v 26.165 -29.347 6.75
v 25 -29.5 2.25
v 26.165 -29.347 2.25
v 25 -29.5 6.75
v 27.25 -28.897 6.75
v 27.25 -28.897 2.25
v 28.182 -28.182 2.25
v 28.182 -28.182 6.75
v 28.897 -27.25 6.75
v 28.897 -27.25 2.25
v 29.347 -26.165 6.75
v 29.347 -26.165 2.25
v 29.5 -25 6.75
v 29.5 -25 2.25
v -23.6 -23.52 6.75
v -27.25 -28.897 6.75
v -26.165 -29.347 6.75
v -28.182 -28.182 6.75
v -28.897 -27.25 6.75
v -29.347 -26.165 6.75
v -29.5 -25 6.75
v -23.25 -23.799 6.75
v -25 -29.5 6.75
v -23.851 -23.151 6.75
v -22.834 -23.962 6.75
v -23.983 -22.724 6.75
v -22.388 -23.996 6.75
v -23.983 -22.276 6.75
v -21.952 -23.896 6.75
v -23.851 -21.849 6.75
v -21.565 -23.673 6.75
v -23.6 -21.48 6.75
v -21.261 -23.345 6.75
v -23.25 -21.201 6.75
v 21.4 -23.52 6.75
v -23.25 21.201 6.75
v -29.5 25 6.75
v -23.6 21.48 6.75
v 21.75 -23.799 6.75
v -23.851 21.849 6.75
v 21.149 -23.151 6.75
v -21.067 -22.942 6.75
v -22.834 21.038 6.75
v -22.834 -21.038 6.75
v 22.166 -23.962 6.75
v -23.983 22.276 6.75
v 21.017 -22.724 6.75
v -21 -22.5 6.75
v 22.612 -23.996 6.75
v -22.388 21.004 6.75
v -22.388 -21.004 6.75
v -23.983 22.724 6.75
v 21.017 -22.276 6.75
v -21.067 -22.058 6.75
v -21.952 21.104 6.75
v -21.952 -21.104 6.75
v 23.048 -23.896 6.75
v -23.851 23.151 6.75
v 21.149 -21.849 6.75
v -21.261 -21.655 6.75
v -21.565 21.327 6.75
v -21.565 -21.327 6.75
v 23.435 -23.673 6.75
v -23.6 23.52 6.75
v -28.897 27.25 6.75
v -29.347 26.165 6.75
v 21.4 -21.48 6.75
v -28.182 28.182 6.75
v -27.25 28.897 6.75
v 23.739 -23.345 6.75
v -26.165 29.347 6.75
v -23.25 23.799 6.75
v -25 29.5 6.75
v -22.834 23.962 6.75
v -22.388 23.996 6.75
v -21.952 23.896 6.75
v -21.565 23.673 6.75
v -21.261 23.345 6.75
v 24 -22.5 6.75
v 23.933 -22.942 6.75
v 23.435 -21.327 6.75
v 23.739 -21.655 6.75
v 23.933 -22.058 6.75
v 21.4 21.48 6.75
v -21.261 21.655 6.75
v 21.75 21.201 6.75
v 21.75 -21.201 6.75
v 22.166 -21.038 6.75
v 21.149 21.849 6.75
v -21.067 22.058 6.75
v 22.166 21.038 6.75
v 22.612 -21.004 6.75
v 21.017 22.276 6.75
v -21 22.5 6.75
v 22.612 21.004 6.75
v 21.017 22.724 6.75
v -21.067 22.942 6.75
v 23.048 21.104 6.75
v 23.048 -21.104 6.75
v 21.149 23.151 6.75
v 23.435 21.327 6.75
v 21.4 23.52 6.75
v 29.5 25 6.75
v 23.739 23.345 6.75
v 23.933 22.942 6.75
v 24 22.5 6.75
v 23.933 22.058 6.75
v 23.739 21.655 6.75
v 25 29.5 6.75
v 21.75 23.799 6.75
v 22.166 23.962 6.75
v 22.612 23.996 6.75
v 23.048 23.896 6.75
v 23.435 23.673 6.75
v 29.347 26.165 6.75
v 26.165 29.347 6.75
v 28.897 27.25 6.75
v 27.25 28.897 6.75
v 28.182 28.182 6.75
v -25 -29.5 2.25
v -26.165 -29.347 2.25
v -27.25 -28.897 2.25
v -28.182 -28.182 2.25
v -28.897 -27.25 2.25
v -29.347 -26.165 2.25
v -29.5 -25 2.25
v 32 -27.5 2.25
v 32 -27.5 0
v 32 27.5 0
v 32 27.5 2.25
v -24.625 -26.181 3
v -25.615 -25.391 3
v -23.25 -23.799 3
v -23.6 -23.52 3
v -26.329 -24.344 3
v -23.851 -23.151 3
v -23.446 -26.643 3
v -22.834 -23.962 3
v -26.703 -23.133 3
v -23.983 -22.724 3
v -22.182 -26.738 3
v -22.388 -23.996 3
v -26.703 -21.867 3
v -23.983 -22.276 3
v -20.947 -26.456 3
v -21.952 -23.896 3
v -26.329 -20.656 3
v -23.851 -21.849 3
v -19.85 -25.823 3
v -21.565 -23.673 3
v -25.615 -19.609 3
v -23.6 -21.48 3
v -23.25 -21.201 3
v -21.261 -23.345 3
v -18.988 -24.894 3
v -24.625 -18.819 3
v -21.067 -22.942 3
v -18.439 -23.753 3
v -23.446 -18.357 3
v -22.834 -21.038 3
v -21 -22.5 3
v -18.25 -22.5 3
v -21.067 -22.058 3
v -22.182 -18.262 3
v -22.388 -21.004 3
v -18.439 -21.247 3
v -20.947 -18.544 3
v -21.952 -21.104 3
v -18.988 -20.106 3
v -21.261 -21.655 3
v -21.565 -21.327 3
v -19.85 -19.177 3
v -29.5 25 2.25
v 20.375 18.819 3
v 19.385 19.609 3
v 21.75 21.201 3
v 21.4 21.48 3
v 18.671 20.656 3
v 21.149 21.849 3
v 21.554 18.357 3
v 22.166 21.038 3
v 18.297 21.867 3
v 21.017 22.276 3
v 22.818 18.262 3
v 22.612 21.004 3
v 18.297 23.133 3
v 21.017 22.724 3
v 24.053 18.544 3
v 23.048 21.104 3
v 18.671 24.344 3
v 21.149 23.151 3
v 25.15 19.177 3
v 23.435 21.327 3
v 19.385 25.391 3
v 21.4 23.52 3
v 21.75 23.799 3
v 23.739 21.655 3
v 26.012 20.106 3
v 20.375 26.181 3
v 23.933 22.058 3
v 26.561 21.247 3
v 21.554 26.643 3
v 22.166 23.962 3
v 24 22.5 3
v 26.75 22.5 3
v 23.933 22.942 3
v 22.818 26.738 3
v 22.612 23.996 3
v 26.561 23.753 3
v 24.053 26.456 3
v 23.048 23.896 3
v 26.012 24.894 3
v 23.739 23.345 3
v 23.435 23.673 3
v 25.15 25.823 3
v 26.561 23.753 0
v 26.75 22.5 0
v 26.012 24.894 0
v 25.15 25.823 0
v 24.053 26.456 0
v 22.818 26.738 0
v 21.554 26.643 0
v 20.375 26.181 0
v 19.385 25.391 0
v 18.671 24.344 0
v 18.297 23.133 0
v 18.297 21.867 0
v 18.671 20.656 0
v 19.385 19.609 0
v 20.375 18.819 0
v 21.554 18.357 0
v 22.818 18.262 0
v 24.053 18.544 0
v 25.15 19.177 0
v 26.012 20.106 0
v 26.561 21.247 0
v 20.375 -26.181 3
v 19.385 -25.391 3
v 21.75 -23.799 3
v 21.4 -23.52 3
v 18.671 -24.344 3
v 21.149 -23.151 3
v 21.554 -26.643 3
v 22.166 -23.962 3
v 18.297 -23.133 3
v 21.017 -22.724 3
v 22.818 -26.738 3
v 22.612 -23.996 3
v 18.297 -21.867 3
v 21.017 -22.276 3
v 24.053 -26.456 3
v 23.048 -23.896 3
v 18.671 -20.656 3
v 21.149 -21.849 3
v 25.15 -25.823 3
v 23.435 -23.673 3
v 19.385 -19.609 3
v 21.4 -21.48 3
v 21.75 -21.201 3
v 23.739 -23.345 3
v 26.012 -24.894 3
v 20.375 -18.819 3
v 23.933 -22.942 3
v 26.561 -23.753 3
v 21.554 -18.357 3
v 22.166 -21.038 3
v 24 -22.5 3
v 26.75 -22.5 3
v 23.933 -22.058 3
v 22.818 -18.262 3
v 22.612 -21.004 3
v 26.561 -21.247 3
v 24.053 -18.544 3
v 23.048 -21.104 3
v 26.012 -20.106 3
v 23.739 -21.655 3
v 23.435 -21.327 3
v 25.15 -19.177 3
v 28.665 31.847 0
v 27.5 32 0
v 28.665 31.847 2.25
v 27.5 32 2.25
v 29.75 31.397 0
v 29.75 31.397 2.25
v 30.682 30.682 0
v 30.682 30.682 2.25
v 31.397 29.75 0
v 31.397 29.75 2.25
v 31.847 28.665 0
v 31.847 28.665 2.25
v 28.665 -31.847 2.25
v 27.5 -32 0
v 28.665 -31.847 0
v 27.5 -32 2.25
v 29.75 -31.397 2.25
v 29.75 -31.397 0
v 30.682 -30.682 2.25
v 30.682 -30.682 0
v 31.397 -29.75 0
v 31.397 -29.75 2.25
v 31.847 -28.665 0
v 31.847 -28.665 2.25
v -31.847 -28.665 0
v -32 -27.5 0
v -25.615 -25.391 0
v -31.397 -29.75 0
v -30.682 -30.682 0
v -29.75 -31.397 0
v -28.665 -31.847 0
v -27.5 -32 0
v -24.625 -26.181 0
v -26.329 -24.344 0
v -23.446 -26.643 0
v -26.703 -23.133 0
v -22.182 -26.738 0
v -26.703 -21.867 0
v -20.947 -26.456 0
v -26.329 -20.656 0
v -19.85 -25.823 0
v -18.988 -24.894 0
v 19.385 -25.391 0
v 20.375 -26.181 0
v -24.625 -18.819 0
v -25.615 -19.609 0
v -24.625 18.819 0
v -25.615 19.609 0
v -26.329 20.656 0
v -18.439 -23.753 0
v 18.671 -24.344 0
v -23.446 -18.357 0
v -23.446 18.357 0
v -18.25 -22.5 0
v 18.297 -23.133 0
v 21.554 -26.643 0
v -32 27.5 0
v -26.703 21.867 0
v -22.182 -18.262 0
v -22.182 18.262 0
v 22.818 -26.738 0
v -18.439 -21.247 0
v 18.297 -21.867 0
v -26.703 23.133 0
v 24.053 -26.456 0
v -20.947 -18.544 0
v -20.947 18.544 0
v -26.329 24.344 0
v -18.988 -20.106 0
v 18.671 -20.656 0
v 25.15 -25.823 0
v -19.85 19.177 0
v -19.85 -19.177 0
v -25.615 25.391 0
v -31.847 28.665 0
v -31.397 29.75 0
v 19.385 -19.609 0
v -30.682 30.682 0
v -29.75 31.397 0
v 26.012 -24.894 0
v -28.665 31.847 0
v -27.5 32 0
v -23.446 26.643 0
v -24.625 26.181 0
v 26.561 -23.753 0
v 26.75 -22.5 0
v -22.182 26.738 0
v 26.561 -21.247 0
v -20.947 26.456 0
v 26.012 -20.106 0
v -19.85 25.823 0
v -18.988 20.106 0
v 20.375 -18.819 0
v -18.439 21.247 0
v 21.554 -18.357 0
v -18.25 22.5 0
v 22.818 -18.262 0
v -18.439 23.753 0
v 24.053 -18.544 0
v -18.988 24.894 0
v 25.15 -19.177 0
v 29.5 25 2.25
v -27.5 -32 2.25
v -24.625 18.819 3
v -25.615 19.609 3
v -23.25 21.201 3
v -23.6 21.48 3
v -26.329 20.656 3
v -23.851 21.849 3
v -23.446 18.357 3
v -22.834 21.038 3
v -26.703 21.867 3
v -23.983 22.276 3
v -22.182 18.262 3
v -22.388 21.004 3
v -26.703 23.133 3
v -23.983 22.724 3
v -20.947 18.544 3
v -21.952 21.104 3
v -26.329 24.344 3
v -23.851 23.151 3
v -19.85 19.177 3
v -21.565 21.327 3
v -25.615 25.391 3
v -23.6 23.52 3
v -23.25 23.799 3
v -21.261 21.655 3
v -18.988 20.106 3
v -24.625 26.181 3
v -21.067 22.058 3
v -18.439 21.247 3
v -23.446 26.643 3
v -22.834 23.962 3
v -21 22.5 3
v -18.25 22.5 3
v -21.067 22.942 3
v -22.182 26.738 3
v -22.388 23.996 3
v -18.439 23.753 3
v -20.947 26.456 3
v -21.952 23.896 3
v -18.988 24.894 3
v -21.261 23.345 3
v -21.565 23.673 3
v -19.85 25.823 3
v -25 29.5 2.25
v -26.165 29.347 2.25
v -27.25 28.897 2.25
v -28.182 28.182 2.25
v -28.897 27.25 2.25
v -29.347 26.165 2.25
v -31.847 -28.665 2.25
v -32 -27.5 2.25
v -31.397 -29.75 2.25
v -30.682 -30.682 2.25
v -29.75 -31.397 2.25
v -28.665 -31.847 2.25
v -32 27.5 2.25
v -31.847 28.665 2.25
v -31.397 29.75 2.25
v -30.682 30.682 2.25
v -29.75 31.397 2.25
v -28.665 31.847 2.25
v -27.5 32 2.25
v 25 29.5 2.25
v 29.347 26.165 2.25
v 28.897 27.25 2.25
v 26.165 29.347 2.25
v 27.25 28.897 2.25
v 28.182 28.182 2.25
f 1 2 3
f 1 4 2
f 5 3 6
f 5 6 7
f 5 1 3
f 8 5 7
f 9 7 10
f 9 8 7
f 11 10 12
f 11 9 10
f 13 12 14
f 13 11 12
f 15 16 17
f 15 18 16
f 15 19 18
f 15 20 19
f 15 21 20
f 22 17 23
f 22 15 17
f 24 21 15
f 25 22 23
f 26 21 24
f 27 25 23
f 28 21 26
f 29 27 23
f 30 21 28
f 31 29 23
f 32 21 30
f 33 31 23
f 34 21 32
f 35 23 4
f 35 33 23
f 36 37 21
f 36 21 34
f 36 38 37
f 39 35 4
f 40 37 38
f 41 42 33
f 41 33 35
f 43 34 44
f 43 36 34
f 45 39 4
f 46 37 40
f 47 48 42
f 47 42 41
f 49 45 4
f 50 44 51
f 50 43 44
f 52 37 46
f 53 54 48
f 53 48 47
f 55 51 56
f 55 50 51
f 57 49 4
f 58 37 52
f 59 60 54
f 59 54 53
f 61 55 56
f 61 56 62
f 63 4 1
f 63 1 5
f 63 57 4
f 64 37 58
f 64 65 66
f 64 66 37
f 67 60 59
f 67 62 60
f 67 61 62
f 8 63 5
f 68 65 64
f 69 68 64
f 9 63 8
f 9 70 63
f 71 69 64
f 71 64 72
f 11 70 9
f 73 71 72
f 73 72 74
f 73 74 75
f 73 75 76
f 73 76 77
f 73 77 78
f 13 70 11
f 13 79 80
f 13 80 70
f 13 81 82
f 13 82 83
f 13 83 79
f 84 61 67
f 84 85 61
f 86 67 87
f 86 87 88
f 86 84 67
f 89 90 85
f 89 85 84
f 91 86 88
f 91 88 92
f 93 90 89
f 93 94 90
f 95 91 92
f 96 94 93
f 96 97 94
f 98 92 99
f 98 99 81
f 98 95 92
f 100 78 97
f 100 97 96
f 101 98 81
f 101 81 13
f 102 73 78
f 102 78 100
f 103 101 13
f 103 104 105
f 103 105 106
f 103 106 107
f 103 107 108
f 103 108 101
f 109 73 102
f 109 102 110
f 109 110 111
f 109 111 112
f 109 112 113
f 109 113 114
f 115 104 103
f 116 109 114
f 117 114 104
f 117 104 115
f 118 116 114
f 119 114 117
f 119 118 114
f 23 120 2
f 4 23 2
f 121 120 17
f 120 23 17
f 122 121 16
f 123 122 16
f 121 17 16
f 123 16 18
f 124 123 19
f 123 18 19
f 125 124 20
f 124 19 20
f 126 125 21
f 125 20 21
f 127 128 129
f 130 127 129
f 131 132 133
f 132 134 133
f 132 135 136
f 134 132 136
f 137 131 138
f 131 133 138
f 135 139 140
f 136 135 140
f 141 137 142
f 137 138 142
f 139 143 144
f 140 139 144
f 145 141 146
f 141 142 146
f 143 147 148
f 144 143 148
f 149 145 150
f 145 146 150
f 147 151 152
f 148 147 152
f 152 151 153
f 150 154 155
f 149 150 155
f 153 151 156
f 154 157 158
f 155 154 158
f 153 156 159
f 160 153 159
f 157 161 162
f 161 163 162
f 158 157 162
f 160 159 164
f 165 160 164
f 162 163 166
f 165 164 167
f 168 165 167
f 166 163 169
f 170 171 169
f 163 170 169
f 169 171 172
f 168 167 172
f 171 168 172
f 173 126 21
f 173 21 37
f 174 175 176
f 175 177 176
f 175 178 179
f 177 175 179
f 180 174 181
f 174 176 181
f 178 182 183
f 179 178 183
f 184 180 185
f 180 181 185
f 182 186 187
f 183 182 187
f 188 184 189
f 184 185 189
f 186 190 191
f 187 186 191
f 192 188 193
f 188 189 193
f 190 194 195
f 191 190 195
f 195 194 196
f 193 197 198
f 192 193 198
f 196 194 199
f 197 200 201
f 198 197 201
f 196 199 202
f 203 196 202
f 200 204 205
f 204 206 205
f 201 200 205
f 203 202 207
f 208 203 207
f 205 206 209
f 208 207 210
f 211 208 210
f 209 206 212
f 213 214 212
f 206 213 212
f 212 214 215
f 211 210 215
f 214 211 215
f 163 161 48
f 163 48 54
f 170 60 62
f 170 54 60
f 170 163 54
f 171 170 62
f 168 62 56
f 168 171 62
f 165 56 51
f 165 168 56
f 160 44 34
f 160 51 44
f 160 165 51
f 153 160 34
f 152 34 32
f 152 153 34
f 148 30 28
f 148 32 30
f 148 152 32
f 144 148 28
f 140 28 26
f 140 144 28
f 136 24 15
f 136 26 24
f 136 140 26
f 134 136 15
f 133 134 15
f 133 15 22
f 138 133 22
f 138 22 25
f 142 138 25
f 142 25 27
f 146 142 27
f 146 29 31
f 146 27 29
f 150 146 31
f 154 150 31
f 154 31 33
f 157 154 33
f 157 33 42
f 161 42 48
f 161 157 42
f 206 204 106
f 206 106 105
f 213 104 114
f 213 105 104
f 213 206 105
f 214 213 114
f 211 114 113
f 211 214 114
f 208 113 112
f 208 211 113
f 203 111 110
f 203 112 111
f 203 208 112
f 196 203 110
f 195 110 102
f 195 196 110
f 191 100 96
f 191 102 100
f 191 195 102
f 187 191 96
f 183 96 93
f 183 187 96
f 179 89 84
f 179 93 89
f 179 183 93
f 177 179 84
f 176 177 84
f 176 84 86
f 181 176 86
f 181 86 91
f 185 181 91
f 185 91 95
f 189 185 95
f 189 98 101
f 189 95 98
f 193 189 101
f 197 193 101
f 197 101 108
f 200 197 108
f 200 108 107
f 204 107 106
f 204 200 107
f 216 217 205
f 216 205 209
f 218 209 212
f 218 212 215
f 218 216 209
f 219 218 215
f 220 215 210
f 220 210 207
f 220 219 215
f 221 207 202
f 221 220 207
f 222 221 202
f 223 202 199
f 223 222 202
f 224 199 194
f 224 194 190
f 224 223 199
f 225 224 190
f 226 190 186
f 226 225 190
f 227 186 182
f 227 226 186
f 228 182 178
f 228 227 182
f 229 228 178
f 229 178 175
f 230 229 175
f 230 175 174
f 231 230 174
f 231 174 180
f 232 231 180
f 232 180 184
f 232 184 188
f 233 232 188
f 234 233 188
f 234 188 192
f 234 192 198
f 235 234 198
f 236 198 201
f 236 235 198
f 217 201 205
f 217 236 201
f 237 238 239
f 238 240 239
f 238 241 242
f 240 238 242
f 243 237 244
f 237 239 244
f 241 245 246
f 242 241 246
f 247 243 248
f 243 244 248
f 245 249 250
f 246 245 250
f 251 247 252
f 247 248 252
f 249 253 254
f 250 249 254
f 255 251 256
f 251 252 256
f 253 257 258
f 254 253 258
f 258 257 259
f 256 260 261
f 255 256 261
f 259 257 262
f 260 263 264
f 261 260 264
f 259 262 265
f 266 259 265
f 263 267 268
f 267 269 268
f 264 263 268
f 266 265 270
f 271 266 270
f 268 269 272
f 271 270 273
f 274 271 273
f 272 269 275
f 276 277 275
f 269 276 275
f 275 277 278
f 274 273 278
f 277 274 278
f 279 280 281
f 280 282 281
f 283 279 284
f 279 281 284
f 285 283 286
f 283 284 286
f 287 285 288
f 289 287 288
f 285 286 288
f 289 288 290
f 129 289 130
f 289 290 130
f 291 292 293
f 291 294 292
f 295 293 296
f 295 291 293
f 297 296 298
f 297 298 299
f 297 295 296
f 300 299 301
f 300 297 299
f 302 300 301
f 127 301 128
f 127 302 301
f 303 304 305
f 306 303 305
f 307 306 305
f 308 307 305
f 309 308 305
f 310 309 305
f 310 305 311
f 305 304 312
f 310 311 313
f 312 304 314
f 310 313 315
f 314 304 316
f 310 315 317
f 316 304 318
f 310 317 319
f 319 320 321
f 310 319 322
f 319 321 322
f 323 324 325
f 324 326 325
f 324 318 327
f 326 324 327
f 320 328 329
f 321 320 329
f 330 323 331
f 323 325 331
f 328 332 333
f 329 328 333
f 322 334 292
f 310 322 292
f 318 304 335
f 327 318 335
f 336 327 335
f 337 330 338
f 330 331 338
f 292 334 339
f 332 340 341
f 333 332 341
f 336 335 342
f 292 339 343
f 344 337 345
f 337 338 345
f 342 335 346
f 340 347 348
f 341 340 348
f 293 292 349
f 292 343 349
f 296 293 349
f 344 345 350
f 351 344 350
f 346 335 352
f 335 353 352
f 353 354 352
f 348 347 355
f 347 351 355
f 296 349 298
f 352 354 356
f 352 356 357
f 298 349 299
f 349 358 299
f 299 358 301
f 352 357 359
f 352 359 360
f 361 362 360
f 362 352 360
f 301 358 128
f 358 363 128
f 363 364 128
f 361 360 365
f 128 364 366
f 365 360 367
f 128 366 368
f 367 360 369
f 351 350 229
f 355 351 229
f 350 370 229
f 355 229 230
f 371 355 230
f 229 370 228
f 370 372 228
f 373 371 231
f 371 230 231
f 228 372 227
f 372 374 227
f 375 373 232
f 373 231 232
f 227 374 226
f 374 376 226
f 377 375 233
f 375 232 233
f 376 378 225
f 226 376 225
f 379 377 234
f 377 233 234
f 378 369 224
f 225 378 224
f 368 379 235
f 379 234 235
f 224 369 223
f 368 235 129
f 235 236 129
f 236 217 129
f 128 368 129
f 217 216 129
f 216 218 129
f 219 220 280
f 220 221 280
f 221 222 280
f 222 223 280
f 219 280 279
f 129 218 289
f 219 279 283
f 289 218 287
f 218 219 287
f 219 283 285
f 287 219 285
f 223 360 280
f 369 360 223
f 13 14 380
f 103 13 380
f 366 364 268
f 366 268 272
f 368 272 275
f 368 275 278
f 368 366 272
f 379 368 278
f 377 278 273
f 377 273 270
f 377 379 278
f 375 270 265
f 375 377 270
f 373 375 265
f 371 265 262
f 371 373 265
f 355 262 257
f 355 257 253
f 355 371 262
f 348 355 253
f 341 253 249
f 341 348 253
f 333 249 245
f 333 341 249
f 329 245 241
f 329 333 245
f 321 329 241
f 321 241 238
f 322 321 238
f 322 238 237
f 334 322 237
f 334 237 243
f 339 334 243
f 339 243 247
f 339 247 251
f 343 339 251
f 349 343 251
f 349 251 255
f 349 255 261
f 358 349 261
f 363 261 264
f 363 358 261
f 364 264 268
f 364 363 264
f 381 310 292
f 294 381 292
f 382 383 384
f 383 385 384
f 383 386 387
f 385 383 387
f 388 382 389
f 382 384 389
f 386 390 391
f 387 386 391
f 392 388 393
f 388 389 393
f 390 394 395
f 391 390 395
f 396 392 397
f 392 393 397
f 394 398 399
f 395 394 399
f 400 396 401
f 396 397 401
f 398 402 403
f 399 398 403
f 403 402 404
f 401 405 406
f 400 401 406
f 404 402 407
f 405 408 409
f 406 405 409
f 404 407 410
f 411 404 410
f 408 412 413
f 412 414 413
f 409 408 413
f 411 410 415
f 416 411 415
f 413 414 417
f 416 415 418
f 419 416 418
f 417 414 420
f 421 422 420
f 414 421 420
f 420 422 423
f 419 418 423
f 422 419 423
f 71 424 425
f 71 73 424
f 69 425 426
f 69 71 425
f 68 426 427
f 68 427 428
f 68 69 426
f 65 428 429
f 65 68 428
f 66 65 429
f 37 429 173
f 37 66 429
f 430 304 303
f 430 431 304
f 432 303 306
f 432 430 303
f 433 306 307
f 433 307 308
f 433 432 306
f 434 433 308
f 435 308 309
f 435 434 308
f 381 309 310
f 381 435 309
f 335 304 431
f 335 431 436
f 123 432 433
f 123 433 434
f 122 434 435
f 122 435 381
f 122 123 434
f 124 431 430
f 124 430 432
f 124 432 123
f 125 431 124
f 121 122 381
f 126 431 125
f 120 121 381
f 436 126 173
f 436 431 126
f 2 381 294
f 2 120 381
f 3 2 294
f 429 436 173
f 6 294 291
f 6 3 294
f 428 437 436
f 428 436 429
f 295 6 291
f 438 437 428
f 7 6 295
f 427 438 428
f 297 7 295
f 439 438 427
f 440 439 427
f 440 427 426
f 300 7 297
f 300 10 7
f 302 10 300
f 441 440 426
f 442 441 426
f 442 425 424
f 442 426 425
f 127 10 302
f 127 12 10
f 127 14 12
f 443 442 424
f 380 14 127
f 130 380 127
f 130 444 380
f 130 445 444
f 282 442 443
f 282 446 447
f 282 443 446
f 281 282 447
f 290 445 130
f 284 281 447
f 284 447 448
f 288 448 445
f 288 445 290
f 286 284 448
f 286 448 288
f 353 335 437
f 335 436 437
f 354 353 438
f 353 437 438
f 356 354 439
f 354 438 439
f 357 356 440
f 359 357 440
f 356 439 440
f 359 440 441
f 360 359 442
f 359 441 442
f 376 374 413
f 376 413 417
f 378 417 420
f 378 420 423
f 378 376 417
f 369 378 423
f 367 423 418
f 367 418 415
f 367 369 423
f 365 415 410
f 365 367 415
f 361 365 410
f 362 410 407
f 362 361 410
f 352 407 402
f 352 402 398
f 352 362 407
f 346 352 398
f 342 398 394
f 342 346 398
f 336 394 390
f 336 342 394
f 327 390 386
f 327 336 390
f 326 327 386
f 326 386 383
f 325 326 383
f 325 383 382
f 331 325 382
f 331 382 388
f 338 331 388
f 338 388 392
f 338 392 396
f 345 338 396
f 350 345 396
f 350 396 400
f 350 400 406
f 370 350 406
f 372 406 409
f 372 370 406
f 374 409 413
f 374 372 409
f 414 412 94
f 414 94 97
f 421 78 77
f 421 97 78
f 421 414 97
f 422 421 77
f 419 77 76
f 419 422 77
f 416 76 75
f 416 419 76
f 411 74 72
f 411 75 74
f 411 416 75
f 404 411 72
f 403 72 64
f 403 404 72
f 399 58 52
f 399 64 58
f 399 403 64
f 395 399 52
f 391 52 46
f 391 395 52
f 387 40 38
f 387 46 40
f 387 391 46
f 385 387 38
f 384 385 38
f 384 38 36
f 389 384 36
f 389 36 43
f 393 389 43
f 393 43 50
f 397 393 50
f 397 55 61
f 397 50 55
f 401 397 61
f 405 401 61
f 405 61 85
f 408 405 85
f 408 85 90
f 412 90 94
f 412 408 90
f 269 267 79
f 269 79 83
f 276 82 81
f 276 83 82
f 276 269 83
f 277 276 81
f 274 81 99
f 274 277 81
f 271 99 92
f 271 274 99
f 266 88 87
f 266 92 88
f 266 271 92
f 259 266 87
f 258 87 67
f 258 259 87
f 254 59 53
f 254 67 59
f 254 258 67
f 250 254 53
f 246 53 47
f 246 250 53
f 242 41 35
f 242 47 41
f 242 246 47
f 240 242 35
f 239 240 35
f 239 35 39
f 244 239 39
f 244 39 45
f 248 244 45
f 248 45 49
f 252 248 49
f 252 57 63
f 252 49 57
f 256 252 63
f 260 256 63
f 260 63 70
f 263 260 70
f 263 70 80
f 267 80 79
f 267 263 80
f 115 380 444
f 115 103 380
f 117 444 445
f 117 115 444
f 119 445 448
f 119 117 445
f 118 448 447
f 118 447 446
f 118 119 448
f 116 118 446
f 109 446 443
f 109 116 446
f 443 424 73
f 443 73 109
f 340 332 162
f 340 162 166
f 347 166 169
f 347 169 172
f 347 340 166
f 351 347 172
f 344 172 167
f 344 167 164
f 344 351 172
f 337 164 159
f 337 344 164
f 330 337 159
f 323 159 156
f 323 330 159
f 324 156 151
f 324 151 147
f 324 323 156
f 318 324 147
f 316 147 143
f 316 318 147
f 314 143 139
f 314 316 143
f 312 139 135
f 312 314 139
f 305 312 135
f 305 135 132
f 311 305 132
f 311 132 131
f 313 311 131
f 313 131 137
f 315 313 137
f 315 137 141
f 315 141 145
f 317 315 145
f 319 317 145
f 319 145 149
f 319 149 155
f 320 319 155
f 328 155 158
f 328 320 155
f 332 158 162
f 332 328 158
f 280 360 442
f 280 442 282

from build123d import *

# Parameters (mm, degrees)
SKETCH_W        = 64
SKETCH_H        = 64
PAD_DEPTH       = 2.25
SKETCH001_W     = 59
SKETCH001_H     = 59
PAD001_DEPTH    = 4.5
SKETCH002_R     = 1.5
POCKET_DEPTH    = 6.751
SKETCH003_R     = 4.25
POCKET001_DEPTH = 3
FILLET_R        = 4.5


with BuildPart() as part:
    # Sketch → Pad (new body)
    with BuildSketch(Plane.XY):
        Rectangle(SKETCH_W, SKETCH_H)
    extrude(amount=PAD_DEPTH)

    # Sketch001 (on Face6 of Pad) → Pad001 (join)
    with BuildSketch(Plane.XY.offset(2.25)):
        Rectangle(SKETCH001_W, SKETCH001_H)
    extrude(amount=PAD001_DEPTH)

    # Sketch002 → Pocket (cut, through all)
    with BuildSketch(Plane.XY):
        with Locations((-22.5, 22.5)):
            Circle(SKETCH002_R)
        with Locations((22.5, 22.5)):
            Circle(SKETCH002_R)
        with Locations((22.5, -22.5)):
            Circle(SKETCH002_R)
        with Locations((-22.5, -22.5)):
            Circle(SKETCH002_R)
    extrude(amount=POCKET_DEPTH, mode=Mode.SUBTRACT)

    # Sketch003 → Pocket001 (cut)
    with BuildSketch(Plane.XY):
        with Locations((-22.5, 22.5)):
            Circle(SKETCH003_R)
        with Locations((22.5, 22.5)):
            Circle(SKETCH003_R)
        with Locations((22.5, -22.5)):
            Circle(SKETCH003_R)
        with Locations((-22.5, -22.5)):
            Circle(SKETCH003_R)
    extrude(amount=POCKET001_DEPTH, mode=Mode.SUBTRACT)

    # Fillet
    fillet_edges = [part.edges().sort_by_distance(p)[0] for p in [
        (29.5, -29.5, 4.5),
        (32, -32, 1.125),
        (29.5, 29.5, 4.5),
        (32, 32, 1.125),
        (-29.5, -29.5, 4.5),
        (-32, -32, 1.125),
        (-29.5, 29.5, 4.5),
        (-32, 32, 1.125),
    ]]
    fillet(fillet_edges, radius=FILLET_R)


solid = part.part
